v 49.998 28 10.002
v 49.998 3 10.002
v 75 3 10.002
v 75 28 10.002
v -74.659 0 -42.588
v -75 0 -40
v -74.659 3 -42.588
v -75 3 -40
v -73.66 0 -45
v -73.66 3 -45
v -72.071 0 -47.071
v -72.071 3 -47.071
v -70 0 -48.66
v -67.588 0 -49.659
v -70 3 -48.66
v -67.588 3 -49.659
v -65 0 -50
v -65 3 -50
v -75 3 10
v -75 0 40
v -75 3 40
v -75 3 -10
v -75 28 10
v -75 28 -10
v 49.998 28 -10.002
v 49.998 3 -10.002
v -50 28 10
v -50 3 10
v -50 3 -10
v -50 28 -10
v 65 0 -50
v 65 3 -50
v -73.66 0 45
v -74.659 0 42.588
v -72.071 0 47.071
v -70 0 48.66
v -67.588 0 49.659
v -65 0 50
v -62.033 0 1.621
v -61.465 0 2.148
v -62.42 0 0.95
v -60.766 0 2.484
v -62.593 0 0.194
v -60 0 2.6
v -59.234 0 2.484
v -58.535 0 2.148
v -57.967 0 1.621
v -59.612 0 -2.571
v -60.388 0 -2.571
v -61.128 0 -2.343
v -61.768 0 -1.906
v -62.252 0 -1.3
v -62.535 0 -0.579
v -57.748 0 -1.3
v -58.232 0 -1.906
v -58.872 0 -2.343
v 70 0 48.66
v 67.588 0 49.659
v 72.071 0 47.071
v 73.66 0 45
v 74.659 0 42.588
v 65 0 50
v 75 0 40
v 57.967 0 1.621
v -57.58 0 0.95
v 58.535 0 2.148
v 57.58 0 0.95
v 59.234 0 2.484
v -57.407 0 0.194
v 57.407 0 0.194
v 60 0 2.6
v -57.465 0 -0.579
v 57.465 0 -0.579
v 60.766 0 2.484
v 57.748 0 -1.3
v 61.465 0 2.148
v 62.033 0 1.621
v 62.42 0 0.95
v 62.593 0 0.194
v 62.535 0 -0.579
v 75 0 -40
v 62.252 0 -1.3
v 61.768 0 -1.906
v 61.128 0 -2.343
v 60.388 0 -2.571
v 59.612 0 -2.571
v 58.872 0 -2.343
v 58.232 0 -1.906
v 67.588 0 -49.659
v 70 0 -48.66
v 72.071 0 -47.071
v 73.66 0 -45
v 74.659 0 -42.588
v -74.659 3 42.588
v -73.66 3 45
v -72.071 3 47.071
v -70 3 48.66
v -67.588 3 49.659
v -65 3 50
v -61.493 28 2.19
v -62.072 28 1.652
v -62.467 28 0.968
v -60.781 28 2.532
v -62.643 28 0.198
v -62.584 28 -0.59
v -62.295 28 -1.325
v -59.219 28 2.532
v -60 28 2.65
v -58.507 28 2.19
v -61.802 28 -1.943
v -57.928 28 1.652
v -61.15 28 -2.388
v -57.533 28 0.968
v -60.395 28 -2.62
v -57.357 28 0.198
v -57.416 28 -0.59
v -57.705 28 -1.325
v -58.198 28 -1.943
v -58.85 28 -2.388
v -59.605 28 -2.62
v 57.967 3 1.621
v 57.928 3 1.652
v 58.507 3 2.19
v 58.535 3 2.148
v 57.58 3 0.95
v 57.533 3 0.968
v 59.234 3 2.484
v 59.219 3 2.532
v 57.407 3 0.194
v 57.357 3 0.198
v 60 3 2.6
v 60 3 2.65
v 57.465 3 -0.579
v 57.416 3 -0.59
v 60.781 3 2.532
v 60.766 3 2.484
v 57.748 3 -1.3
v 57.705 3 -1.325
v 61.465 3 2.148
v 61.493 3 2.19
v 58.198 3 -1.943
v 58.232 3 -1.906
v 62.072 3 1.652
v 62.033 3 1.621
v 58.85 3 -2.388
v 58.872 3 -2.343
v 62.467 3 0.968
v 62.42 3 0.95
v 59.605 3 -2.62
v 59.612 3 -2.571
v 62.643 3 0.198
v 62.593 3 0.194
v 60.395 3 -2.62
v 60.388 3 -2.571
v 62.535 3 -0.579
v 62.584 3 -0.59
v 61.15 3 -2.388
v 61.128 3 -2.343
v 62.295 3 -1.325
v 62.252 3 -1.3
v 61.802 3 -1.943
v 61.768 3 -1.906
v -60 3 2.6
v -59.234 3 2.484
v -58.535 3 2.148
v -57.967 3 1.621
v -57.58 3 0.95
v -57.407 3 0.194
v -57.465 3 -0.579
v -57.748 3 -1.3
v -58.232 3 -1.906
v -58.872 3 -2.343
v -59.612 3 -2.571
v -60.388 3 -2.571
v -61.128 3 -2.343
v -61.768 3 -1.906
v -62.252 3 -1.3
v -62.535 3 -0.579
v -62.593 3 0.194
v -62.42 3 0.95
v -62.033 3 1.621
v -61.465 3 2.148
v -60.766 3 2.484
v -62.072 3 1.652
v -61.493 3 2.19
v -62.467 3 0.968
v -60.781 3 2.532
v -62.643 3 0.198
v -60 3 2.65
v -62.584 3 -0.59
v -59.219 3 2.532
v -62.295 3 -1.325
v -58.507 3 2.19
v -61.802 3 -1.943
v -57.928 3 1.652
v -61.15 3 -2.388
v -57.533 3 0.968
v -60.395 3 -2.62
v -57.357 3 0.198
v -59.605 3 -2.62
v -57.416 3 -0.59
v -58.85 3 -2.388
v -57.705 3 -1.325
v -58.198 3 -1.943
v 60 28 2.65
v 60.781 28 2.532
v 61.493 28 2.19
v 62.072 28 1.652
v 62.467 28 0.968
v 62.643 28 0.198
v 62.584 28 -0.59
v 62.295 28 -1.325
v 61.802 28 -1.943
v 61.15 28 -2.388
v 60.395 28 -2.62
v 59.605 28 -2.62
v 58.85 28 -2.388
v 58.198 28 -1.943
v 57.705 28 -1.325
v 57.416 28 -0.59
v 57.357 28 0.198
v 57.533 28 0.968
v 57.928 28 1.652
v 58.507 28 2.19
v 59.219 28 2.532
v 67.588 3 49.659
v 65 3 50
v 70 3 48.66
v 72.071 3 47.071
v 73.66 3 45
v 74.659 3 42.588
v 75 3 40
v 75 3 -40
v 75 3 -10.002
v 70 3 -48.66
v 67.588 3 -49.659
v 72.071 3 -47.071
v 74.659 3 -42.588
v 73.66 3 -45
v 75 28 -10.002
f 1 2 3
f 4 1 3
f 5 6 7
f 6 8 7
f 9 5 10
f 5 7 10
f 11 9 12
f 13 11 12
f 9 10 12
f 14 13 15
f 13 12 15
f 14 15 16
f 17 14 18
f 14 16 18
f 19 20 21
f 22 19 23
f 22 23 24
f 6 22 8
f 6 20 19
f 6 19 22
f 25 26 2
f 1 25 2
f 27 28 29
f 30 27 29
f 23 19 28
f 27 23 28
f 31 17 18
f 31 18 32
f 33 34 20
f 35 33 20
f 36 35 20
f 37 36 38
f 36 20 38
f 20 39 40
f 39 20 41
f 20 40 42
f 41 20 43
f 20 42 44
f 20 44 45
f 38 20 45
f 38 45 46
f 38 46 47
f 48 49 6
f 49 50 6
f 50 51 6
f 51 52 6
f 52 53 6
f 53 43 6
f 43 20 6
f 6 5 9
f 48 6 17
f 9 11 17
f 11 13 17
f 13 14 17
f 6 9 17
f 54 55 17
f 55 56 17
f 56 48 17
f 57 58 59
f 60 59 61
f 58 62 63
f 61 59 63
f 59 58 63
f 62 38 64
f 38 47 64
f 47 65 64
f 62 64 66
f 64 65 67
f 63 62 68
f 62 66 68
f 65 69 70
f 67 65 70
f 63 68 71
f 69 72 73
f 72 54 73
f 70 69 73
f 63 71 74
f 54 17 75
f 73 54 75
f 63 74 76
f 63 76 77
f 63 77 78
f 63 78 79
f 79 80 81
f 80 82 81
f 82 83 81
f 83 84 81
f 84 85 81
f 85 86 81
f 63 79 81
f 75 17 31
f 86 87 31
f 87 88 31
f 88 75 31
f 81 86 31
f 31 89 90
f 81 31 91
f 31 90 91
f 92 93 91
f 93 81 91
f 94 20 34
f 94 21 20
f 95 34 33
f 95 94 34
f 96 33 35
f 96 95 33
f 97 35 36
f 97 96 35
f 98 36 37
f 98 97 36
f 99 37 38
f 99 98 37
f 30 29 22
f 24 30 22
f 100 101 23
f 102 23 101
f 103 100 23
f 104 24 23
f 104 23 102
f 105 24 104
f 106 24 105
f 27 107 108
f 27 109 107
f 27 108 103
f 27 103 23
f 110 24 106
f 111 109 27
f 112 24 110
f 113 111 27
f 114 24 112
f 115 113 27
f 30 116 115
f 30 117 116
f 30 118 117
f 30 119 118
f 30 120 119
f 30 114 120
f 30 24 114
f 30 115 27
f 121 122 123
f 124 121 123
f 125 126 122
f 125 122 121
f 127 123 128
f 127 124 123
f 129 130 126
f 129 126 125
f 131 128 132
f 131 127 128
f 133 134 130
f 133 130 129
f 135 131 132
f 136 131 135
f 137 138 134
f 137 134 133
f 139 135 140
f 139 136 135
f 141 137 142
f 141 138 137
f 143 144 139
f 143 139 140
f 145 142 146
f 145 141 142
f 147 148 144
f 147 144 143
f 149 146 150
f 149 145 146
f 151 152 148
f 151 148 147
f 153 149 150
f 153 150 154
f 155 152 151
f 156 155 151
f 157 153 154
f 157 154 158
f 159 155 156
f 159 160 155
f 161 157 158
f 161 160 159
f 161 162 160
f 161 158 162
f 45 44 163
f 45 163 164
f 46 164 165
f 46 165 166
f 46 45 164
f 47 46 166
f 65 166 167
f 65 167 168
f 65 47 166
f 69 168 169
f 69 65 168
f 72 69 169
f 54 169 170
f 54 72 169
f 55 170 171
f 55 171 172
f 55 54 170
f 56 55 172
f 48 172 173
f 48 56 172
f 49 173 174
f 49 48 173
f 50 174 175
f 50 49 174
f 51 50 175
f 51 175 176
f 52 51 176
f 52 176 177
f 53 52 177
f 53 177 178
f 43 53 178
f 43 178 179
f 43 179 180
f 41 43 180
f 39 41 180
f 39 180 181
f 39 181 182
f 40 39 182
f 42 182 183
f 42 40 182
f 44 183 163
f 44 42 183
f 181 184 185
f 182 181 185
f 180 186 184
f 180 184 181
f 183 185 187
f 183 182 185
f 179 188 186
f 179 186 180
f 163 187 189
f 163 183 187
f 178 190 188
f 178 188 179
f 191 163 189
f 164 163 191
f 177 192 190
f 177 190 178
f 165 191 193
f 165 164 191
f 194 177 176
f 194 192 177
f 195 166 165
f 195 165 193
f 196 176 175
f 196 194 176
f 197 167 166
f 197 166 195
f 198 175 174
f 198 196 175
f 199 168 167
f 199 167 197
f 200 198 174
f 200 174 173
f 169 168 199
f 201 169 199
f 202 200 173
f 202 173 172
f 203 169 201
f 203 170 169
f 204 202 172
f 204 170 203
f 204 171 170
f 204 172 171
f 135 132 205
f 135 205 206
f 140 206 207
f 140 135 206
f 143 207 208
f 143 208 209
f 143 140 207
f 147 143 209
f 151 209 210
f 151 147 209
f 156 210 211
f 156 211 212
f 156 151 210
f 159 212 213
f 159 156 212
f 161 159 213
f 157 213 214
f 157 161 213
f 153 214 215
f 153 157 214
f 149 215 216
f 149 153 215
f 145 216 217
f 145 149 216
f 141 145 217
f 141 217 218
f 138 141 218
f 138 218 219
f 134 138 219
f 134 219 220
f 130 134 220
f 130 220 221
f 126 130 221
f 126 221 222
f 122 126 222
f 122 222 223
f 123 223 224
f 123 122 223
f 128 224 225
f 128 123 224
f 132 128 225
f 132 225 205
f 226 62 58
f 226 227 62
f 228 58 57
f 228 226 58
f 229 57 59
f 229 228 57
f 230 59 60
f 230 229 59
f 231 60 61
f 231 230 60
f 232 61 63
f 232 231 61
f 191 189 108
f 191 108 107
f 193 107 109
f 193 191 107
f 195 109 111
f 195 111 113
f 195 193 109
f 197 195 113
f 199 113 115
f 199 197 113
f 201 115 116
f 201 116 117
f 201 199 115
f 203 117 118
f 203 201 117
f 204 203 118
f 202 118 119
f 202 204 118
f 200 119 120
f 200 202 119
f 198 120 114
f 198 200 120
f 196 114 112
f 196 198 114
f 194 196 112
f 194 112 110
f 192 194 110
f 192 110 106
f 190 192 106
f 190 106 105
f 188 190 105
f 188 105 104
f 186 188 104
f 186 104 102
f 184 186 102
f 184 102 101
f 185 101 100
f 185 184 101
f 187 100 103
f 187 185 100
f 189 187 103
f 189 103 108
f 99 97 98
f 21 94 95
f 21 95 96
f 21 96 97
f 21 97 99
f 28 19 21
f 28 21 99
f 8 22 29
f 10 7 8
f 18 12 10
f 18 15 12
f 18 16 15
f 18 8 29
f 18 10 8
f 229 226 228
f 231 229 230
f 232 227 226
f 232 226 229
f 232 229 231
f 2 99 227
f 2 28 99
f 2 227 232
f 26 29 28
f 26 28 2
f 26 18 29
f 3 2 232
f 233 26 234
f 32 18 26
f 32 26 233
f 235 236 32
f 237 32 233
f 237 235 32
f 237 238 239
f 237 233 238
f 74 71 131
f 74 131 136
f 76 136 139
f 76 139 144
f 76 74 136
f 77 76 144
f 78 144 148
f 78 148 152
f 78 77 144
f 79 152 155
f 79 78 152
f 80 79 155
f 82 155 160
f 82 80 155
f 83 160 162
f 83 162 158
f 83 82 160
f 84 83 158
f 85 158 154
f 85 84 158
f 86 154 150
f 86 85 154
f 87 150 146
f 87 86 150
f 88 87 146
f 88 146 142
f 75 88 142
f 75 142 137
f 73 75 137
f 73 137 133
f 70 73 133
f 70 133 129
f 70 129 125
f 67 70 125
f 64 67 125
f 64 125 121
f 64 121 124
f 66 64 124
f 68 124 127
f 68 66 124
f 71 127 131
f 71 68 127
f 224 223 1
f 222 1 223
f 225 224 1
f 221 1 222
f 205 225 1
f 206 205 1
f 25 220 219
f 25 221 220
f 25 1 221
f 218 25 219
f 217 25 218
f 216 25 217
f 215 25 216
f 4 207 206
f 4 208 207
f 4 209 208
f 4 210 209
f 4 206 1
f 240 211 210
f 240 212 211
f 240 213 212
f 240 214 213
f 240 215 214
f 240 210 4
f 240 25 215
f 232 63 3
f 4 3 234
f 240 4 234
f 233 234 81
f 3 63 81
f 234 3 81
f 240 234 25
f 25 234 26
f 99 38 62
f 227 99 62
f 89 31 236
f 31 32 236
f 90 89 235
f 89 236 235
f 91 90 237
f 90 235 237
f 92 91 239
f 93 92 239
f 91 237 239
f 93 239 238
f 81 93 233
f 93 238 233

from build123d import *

# Parameters (mm, degrees)
SKETCH1_W           = 150
SKETCH1_H           = 100
SKETCH1_R           = 2.6
BOSS_EXTRUDE1_DEPTH = 3
SKETCH2_R           = 2.65
BOSS_EXTRUDE2_DEPTH = 25
FILLET1_R           = 10


with BuildPart() as part:
    # Sketch1 → Boss-Extrude1 (new body)
    with BuildSketch(Plane(origin=(0, 0, 0), x_dir=(1, 0, 0), z_dir=(0, 1, 0))):
        Rectangle(SKETCH1_W, SKETCH1_H)
        with Locations(Location((-60, 0, 0), (0, 0, 270))):
            Circle(SKETCH1_R, mode=Mode.SUBTRACT)
        with Locations(Location((60, 0, 0), (0, 0, 270))):
            Circle(SKETCH1_R, mode=Mode.SUBTRACT)
    extrude(amount=BOSS_EXTRUDE1_DEPTH)

    # Sketch2 → Boss-Extrude2 (add)
    # profile 1 of 2: a face of its own
    with BuildSketch(Plane(origin=(0, 3, 0), x_dir=(1, 0, 0), z_dir=(0, 1, 0))):
        Polygon((-70, -10), (-50, -10), (-50, 10), (-70, 10), (-75, 10), (-75, -10), align=None)
        with Locations(Location((-60, 0, 0), (0, 0, 270))):
            Circle(SKETCH2_R, mode=Mode.SUBTRACT)
    # profile 2 of 2: a face of its own
    with BuildSketch(Plane(origin=(0, 3, 0), x_dir=(1, 0, 0), z_dir=(0, 1, 0))):
        Polygon((49.997605223, -10.002394777), (70.002394777, -10.002394777), (75, -10.002394777), (75, 10.002394777), (70.002394777, 10.002394777), (49.997605223, 10.002394777), align=None)
        with Locations(Location((60, 0, 0), (0, 0, 270))):
            Circle(SKETCH2_R, mode=Mode.SUBTRACT)
    extrude(amount=BOSS_EXTRUDE2_DEPTH)

    # Fillet1
    fillet1_edges = [part.edges().sort_by_distance(p)[0] for p in [
        (75, 1.5, 50),
        (-75, 1.5, 50),
        (-75, 1.5, -50),
        (75, 1.5, -50),
    ]]
    fillet(fillet1_edges, radius=FILLET1_R)


solid = part.part
